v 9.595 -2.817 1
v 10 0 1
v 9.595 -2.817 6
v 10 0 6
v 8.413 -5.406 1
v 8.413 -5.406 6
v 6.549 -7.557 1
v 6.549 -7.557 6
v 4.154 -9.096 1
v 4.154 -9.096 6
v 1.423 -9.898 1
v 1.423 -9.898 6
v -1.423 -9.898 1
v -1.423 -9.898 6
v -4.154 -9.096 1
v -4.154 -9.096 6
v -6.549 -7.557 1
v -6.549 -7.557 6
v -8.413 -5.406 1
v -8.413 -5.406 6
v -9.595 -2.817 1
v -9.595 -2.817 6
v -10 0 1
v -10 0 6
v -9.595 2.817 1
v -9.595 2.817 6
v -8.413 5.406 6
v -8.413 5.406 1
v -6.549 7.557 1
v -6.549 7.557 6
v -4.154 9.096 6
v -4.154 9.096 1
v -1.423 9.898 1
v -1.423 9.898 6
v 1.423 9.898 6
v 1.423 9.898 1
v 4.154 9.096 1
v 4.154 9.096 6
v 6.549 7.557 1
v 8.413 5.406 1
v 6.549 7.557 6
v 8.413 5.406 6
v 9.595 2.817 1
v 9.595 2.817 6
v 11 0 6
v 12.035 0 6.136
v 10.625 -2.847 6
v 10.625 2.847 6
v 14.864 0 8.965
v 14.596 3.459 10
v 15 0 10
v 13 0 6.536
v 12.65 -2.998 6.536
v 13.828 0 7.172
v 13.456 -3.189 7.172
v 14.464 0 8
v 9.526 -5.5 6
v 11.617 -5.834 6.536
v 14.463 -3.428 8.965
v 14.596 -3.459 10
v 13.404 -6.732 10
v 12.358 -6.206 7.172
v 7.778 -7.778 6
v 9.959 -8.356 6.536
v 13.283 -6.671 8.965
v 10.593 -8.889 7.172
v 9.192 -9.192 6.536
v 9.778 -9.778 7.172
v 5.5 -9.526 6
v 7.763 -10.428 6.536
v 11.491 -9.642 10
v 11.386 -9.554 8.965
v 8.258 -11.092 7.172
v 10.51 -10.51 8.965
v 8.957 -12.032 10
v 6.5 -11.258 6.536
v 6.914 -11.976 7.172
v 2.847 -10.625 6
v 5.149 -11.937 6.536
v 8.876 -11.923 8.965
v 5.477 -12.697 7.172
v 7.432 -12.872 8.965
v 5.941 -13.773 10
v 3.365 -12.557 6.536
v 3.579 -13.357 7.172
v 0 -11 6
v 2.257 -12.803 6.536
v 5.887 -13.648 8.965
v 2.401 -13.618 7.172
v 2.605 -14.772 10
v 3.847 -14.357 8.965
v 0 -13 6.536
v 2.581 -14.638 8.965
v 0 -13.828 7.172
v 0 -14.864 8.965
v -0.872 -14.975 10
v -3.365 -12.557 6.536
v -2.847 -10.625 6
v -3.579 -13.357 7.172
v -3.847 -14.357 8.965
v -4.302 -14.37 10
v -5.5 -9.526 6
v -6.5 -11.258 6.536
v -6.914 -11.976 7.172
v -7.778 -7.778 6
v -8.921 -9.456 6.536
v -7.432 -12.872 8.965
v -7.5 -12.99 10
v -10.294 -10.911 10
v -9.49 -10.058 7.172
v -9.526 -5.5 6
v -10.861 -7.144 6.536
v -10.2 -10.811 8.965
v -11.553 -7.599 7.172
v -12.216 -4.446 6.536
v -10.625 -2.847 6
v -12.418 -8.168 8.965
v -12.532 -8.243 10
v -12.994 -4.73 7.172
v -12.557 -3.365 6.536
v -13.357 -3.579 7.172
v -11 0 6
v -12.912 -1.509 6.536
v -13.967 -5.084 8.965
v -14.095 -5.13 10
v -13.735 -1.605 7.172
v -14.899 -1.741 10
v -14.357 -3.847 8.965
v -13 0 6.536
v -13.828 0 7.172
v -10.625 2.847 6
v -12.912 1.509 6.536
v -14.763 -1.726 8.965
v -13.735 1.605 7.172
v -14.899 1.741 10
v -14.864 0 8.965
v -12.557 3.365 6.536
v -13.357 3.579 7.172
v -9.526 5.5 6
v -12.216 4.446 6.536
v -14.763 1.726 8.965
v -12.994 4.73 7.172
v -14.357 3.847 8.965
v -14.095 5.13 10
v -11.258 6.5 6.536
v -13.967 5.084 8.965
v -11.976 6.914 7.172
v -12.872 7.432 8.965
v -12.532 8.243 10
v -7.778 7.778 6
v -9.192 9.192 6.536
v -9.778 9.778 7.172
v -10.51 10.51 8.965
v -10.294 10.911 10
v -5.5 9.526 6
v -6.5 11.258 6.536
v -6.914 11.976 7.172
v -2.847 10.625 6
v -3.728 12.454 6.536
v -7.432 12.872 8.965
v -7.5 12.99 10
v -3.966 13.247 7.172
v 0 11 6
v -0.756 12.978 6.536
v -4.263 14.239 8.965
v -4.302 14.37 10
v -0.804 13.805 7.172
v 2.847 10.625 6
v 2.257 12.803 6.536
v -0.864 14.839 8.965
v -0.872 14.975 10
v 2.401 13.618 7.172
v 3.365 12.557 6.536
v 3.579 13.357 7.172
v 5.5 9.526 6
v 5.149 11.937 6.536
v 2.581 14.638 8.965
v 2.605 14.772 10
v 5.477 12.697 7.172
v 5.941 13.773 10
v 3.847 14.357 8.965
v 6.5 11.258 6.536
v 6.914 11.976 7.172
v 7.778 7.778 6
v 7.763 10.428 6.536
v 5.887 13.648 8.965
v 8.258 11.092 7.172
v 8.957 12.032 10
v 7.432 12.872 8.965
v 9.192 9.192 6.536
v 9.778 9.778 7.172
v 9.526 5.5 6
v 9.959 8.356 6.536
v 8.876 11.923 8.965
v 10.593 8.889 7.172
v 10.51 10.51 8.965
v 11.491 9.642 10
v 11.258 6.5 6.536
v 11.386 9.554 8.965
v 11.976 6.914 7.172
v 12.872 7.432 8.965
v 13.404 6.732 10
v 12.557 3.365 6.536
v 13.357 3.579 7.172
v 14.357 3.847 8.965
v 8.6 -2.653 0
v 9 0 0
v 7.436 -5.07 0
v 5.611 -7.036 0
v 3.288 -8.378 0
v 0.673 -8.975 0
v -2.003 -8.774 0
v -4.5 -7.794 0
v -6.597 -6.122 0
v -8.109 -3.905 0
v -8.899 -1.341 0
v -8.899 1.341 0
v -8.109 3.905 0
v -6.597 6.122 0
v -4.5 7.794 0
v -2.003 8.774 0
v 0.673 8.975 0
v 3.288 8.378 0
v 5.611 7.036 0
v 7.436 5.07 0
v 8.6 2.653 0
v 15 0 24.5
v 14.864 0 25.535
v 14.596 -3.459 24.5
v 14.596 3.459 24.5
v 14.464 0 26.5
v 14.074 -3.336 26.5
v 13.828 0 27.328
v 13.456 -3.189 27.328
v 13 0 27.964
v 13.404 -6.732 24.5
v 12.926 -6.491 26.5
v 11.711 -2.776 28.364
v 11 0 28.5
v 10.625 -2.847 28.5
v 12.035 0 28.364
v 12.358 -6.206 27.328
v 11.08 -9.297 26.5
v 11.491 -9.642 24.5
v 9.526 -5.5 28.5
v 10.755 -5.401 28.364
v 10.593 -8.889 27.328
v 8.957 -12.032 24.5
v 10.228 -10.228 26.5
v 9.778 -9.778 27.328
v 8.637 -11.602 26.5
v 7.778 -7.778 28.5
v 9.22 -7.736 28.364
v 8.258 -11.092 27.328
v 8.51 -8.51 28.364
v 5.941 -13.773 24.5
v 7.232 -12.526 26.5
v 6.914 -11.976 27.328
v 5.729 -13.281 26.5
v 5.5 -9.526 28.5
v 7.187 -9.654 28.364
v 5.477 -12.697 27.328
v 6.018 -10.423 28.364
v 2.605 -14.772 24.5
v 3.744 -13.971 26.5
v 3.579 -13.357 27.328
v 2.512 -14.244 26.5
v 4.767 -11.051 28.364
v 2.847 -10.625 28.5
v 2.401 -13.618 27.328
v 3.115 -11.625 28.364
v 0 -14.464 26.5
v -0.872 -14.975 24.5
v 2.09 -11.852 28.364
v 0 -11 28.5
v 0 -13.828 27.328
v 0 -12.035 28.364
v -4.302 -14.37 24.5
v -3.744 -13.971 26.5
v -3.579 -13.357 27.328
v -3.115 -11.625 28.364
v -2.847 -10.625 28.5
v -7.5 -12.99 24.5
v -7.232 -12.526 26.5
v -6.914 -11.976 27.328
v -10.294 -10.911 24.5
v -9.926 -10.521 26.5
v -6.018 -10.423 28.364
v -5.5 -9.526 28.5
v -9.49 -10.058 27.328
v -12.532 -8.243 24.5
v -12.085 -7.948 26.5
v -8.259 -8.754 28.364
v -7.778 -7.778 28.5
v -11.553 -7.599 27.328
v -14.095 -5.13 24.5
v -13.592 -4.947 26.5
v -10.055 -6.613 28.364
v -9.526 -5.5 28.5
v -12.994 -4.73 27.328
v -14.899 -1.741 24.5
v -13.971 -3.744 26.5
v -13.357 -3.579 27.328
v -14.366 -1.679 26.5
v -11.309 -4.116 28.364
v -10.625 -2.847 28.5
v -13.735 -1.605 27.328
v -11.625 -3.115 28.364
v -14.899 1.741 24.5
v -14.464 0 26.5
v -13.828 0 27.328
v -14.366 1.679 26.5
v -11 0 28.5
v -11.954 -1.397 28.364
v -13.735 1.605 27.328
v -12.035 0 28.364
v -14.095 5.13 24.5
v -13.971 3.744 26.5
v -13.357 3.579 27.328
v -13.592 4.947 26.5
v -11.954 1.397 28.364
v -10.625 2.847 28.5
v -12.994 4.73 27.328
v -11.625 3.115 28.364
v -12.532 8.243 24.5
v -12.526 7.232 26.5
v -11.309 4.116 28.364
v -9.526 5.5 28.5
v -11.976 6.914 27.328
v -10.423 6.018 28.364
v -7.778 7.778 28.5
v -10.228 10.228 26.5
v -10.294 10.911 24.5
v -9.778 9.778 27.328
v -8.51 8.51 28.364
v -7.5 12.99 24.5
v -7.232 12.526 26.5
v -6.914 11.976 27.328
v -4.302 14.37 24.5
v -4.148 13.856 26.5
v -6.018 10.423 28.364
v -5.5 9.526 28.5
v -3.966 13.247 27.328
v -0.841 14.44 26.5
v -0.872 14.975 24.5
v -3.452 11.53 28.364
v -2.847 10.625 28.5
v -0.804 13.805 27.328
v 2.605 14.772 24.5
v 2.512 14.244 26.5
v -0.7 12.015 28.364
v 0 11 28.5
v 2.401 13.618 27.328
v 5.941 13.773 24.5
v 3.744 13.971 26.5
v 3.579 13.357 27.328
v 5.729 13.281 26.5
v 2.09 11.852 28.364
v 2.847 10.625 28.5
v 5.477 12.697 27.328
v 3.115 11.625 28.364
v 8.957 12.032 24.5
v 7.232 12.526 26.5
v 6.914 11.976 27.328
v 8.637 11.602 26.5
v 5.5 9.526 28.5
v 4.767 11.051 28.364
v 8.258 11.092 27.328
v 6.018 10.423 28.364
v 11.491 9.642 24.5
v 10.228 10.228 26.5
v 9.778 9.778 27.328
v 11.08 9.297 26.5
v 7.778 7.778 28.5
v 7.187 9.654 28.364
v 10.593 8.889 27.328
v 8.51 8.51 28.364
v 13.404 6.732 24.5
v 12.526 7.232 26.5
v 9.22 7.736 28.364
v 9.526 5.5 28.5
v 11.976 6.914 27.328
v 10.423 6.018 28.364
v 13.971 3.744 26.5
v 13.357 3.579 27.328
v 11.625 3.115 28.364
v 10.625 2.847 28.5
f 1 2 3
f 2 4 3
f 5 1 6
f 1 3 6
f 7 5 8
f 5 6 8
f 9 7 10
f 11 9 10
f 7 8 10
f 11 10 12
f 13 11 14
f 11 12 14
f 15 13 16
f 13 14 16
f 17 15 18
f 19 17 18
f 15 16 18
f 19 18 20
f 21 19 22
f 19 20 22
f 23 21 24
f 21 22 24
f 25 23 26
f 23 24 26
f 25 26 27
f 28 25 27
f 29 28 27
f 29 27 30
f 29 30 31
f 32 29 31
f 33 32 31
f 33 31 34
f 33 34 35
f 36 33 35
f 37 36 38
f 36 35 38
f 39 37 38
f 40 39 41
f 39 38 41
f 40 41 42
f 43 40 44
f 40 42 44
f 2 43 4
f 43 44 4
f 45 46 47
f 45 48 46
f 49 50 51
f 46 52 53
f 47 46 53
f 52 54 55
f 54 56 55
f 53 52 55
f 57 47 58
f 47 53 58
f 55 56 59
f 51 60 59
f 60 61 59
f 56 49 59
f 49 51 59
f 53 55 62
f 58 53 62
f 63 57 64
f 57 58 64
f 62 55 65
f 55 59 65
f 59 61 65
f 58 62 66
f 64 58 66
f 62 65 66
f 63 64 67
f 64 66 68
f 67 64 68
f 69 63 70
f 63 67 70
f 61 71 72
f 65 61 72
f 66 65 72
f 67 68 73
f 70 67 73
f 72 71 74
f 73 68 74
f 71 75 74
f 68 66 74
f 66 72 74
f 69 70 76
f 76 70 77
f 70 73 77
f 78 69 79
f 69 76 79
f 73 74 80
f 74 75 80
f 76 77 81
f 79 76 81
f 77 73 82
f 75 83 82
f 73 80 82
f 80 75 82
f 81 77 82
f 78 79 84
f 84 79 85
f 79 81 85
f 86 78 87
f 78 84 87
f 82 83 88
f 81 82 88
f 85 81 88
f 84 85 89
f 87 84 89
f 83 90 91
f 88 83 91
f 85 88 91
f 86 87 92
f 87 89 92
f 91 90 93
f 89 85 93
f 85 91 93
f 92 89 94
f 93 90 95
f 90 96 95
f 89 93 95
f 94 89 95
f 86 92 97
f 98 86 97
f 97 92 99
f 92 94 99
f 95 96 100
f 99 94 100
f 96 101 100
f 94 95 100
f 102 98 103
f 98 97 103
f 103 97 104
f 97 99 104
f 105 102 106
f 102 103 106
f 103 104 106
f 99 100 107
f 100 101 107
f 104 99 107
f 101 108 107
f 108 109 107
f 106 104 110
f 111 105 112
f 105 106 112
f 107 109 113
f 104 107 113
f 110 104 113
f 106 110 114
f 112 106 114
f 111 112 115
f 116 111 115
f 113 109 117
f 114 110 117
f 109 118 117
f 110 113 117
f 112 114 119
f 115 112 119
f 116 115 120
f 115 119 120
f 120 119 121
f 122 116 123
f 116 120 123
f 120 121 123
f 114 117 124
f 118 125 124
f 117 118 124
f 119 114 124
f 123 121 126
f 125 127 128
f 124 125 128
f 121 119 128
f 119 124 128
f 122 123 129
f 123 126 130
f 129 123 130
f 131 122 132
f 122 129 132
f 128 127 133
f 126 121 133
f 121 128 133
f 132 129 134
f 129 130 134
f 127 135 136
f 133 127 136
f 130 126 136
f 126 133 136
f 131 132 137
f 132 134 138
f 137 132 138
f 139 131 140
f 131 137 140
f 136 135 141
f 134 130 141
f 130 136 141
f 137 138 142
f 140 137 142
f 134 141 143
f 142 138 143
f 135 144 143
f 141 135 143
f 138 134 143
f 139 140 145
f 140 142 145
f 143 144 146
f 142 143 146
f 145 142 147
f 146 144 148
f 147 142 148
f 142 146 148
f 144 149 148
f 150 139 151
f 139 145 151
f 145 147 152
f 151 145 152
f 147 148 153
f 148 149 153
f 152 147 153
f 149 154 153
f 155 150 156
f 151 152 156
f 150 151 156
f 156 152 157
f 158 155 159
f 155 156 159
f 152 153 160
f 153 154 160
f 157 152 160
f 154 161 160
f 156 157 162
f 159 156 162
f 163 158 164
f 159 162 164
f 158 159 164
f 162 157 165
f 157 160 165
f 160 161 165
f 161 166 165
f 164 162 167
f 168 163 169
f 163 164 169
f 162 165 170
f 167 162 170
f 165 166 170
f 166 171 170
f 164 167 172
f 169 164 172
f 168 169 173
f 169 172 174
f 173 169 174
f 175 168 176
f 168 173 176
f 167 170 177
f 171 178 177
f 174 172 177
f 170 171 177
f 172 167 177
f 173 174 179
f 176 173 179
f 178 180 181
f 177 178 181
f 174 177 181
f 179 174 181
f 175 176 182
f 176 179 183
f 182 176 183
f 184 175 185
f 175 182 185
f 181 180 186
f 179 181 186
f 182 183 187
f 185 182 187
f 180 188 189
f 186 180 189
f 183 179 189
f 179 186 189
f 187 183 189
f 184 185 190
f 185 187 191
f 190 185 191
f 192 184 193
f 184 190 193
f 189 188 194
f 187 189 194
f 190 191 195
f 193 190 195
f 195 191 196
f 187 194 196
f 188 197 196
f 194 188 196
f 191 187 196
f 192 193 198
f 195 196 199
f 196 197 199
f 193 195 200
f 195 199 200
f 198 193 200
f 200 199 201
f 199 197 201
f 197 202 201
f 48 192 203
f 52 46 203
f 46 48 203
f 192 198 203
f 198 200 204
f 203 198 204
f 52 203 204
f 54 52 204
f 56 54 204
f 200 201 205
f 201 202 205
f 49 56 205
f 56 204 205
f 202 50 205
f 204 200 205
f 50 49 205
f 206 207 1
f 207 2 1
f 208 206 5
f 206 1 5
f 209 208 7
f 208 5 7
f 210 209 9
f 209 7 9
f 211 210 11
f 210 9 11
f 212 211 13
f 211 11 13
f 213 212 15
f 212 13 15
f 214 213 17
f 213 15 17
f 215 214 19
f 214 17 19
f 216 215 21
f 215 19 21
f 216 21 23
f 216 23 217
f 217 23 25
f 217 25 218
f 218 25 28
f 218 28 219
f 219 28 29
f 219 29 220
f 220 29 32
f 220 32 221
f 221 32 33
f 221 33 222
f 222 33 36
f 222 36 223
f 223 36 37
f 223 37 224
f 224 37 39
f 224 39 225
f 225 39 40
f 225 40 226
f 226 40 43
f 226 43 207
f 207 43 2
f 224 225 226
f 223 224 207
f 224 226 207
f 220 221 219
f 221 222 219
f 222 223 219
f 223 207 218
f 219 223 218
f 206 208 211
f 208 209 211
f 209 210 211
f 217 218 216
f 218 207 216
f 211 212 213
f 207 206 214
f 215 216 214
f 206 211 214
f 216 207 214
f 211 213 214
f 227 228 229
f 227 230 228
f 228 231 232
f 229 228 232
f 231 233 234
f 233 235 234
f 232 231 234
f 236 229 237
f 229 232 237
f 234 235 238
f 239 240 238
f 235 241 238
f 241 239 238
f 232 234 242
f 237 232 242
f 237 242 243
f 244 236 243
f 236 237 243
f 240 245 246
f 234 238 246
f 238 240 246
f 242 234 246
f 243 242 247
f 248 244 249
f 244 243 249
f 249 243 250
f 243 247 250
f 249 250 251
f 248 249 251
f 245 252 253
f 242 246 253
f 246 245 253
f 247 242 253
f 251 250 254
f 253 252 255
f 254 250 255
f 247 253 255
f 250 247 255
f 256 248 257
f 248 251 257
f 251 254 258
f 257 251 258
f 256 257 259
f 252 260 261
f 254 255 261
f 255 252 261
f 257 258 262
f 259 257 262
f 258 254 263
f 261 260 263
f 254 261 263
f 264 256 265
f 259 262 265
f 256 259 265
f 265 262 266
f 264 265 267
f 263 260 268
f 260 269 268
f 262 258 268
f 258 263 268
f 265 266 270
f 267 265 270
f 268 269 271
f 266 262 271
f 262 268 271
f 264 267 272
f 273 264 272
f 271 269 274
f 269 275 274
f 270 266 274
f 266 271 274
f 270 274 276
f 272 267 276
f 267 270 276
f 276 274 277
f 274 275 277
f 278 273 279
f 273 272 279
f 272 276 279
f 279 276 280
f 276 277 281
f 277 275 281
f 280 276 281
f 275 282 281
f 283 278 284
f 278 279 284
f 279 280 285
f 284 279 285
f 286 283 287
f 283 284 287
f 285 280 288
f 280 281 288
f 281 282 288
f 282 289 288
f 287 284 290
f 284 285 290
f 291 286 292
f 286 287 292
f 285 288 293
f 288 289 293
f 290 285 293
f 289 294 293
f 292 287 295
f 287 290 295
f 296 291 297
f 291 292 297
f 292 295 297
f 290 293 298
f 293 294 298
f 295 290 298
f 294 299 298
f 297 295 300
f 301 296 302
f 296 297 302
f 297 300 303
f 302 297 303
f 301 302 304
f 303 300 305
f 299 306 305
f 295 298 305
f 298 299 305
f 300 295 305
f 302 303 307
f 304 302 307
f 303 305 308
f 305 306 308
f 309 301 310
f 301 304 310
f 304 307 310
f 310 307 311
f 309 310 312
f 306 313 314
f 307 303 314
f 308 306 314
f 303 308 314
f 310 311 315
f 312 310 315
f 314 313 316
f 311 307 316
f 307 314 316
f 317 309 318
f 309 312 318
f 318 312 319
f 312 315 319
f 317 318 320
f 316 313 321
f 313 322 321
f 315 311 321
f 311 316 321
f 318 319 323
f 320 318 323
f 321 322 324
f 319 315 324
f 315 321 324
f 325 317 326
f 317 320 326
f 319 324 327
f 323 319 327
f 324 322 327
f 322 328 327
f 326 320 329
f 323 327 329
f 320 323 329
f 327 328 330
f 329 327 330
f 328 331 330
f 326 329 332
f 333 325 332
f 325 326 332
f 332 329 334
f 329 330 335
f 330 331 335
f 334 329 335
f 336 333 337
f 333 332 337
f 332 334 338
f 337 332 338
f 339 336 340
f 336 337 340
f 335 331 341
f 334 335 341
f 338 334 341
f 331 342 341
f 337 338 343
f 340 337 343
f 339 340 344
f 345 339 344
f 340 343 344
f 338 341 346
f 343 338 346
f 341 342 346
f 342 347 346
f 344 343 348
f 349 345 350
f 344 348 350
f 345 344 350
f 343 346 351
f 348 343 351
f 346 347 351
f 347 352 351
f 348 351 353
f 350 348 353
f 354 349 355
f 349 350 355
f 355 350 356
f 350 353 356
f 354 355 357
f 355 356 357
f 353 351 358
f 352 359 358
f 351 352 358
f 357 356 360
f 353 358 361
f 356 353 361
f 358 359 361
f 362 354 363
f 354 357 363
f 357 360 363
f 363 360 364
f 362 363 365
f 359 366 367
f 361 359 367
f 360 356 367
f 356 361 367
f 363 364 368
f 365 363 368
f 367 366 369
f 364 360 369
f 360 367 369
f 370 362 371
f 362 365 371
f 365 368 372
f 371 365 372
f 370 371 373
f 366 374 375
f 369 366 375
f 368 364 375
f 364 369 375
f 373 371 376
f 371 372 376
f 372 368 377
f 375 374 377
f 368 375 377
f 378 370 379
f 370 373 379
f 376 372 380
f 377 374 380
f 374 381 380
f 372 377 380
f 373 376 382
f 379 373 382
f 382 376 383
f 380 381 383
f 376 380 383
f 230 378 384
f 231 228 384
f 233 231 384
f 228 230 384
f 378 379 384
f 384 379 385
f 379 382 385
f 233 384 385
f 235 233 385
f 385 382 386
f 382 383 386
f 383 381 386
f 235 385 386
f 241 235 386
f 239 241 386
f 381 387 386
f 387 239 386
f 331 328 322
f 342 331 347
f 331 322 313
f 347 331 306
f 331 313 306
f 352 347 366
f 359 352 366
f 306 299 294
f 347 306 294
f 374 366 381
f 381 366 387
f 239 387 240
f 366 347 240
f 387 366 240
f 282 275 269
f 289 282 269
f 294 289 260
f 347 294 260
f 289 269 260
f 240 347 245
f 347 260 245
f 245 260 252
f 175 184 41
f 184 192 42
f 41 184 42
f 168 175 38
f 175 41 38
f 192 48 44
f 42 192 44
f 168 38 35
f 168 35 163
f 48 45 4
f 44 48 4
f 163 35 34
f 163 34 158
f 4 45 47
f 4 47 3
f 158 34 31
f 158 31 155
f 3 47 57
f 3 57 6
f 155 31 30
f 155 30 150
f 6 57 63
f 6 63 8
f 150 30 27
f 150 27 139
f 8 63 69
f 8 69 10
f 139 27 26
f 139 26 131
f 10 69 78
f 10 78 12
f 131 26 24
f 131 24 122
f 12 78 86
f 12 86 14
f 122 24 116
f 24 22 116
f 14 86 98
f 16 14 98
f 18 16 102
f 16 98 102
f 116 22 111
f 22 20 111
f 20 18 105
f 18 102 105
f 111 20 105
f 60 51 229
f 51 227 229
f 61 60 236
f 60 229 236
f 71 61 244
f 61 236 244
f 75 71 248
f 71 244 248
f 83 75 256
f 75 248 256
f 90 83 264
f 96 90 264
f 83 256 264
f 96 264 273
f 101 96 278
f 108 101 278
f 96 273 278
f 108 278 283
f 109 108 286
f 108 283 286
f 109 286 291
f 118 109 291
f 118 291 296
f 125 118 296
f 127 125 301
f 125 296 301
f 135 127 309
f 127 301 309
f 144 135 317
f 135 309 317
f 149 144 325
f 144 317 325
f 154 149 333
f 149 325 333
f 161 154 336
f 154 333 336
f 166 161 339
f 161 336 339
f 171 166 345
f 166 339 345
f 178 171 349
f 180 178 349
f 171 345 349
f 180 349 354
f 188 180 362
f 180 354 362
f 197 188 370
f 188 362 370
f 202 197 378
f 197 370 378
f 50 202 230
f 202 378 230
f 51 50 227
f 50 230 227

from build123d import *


with BuildPart() as f1:
    # F0 (on Front) → F1 (revolve)
    with BuildSketch(Plane.XZ):
        with BuildLine():
            Line((9, 0), (10, 1))
            Line((10, 1), (10, 6))
            Line((10, 6), (11, 6))
            ThreePointArc((11, 6), (13.828427, 7.171573), (15, 10))
            Line((15, 10), (15, 24.5))
            ThreePointArc((15, 24.5), (13.828427, 27.328427), (11, 28.5))
            Line((11, 28.5), (0, 28.5))
            Line((0, 28.5), (0, 0))
            Line((0, 0), (9, 0))
        make_face()
    revolve(axis=Axis((0, 0, 14.25), (0, 0, -1)))


solid = f1.part
